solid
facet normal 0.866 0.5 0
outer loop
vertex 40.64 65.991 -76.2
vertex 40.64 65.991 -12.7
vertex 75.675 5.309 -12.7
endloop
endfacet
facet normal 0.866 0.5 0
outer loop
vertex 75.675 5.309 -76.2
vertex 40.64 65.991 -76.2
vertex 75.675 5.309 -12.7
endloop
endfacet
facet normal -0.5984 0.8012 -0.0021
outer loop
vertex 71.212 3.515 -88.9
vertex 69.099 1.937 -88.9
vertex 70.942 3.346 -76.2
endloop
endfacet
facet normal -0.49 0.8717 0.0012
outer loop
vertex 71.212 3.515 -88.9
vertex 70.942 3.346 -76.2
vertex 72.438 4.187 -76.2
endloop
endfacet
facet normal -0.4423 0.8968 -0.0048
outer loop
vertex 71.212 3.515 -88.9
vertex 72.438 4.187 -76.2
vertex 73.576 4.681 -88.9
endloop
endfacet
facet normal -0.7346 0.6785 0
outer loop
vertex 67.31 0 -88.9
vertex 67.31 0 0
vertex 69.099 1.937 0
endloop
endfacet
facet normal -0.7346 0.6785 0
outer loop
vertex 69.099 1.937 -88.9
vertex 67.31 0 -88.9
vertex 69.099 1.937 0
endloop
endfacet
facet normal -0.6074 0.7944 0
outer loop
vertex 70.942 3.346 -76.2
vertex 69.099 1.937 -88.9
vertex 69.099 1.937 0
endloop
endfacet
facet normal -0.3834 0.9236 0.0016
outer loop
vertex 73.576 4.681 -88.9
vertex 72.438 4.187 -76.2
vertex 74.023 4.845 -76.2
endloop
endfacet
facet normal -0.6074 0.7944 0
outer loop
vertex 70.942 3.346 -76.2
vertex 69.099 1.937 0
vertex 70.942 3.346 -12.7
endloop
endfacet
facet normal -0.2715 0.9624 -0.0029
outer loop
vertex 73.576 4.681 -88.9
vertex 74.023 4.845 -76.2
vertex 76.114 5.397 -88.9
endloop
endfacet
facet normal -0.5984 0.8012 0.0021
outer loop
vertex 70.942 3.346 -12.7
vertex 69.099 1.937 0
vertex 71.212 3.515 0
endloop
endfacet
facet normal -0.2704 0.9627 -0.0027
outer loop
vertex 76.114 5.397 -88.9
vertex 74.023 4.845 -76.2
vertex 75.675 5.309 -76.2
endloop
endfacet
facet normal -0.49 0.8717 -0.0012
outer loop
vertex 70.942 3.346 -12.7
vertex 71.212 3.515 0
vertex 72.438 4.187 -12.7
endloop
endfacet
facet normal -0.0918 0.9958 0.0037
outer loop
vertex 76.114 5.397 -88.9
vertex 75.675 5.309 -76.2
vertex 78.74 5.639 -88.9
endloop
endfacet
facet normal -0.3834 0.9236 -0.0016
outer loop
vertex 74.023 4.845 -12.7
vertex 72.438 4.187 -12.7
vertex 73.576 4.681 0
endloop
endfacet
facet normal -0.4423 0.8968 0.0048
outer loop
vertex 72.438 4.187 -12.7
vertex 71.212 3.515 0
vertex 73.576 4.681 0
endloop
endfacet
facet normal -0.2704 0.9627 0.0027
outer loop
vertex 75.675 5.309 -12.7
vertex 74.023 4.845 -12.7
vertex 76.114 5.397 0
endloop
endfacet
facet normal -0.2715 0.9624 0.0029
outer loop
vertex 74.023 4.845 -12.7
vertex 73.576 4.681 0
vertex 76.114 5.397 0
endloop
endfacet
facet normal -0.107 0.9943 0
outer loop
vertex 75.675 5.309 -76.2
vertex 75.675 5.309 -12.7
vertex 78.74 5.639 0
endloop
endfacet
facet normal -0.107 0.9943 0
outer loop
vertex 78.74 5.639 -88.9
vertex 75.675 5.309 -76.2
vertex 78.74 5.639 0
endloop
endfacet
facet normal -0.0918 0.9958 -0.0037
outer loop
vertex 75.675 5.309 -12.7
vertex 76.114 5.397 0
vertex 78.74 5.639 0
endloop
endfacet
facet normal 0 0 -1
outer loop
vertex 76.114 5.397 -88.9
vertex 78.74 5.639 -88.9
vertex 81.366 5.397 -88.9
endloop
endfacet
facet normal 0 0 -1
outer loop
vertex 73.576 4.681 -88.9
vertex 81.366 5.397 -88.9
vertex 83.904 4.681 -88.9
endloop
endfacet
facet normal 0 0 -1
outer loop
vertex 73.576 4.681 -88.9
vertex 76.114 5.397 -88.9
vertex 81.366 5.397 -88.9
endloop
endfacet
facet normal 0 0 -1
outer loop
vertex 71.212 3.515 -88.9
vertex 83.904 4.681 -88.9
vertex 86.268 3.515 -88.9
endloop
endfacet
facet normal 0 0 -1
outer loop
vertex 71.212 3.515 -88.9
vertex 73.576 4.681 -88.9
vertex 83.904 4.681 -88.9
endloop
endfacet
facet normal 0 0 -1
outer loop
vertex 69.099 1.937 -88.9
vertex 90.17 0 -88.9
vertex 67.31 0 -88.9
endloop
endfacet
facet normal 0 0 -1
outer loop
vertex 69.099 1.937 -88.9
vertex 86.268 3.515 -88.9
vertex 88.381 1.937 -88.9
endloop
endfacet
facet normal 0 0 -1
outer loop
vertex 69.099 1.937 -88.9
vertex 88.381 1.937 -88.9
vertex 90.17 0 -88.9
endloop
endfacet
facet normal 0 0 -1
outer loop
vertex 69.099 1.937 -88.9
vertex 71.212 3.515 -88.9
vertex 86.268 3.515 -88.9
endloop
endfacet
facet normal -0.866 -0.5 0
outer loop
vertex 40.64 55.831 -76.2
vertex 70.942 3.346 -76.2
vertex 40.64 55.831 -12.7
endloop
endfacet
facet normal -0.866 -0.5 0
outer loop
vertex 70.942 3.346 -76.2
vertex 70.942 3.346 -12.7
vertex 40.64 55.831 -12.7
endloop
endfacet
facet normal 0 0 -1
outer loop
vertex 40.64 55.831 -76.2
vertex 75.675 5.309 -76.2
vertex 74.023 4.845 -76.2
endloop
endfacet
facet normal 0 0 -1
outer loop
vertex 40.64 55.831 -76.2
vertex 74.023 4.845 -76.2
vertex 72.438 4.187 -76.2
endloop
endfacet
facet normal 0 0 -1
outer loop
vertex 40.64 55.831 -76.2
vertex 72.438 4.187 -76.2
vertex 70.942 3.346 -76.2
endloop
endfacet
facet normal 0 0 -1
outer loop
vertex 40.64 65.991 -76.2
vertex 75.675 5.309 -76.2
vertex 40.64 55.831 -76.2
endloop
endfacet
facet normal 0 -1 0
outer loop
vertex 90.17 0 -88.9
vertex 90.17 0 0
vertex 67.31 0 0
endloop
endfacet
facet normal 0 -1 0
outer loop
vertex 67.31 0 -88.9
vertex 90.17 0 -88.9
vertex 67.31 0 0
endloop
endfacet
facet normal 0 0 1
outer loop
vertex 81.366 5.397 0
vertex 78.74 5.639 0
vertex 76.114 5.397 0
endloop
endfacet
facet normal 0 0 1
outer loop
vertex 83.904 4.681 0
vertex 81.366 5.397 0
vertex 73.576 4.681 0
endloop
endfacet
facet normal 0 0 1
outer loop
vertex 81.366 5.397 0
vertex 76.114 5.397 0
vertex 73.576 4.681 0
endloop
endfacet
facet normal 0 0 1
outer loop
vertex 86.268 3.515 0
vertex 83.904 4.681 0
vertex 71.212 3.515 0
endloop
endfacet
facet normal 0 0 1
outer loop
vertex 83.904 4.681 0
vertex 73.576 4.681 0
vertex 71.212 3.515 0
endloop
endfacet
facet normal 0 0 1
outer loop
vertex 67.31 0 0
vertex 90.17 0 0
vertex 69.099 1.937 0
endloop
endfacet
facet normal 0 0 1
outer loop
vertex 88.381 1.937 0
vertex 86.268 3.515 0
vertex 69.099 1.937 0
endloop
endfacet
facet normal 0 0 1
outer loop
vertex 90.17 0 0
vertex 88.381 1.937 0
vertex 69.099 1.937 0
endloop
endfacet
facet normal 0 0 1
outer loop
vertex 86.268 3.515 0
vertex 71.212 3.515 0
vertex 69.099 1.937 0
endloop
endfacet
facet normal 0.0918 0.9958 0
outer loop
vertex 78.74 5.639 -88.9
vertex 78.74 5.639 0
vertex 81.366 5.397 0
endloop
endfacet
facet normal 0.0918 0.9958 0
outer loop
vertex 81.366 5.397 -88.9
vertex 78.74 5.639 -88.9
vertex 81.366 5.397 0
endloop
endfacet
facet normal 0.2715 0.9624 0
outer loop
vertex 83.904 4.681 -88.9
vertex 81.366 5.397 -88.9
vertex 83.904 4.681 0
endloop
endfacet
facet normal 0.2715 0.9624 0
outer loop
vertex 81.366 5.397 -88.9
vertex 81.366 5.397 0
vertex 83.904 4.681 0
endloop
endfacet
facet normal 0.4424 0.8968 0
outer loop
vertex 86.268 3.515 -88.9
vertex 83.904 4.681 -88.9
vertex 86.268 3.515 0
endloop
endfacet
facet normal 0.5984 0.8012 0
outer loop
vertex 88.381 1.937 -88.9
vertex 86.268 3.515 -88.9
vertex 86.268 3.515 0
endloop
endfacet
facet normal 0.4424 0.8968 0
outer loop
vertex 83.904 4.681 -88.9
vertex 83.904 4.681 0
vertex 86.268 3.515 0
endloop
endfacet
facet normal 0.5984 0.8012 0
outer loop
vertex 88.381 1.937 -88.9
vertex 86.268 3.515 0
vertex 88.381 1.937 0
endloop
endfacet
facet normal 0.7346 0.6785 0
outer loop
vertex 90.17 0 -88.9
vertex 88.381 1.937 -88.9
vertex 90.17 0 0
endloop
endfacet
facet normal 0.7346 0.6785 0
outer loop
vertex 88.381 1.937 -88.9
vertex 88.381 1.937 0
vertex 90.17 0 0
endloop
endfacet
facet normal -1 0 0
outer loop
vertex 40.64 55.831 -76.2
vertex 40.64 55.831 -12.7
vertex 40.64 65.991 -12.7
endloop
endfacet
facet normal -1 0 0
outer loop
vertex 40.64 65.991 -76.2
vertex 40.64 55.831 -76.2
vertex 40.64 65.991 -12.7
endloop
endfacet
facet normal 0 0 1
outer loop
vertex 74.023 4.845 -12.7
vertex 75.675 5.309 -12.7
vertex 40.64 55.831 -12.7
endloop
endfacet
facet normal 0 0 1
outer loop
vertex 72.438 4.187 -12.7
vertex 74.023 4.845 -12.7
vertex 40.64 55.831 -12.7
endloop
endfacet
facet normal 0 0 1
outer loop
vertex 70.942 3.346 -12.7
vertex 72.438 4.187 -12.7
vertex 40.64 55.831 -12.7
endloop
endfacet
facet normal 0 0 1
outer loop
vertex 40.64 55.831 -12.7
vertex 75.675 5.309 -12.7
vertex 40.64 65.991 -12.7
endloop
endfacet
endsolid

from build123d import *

# Parameters (mm, degrees)
BOSS_EXTRUDE1_DEPTH      = 88.9
BOSS_EXTRUDE2_DEPTH      = 31.75
BOSS_EXTRUDE2_DEPTH_BACK = 31.75


with BuildPart() as part:
    # Sketch2 → Boss-Extrude1 (new body)
    with BuildSketch(Plane.XY):
        with BuildLine():
            Line((90.17, 0), (67.31, 0))
            ThreePointArc((67.31, 0), (72.367383476, 4.152406467), (78.74, 5.6388))
            ThreePointArc((78.74, 5.6388), (85.112616524, 4.152406467), (90.17, 0))
        make_face()
    extrude(amount=-BOSS_EXTRUDE1_DEPTH)

    # Sketch3 → Boss-Extrude2 (add, two sides)
    with BuildSketch(Plane.XY.offset(-44.45)) as boss_extrude2_sk:
        with BuildLine():
            Line((40.64, 65.991135768), (75.674904681, 5.308900822))
            ThreePointArc((75.674904681, 5.308900822), (73.244625787, 4.48173949), (70.942491559, 3.345680792))
            Line((70.942491559, 3.345680792), (40.64, 55.831135768))
            Line((40.64, 55.831135768), (40.64, 65.991135768))
        make_face()
    extrude(amount=BOSS_EXTRUDE2_DEPTH)
    extrude(boss_extrude2_sk.sketch, amount=-BOSS_EXTRUDE2_DEPTH_BACK)


solid = part.part
